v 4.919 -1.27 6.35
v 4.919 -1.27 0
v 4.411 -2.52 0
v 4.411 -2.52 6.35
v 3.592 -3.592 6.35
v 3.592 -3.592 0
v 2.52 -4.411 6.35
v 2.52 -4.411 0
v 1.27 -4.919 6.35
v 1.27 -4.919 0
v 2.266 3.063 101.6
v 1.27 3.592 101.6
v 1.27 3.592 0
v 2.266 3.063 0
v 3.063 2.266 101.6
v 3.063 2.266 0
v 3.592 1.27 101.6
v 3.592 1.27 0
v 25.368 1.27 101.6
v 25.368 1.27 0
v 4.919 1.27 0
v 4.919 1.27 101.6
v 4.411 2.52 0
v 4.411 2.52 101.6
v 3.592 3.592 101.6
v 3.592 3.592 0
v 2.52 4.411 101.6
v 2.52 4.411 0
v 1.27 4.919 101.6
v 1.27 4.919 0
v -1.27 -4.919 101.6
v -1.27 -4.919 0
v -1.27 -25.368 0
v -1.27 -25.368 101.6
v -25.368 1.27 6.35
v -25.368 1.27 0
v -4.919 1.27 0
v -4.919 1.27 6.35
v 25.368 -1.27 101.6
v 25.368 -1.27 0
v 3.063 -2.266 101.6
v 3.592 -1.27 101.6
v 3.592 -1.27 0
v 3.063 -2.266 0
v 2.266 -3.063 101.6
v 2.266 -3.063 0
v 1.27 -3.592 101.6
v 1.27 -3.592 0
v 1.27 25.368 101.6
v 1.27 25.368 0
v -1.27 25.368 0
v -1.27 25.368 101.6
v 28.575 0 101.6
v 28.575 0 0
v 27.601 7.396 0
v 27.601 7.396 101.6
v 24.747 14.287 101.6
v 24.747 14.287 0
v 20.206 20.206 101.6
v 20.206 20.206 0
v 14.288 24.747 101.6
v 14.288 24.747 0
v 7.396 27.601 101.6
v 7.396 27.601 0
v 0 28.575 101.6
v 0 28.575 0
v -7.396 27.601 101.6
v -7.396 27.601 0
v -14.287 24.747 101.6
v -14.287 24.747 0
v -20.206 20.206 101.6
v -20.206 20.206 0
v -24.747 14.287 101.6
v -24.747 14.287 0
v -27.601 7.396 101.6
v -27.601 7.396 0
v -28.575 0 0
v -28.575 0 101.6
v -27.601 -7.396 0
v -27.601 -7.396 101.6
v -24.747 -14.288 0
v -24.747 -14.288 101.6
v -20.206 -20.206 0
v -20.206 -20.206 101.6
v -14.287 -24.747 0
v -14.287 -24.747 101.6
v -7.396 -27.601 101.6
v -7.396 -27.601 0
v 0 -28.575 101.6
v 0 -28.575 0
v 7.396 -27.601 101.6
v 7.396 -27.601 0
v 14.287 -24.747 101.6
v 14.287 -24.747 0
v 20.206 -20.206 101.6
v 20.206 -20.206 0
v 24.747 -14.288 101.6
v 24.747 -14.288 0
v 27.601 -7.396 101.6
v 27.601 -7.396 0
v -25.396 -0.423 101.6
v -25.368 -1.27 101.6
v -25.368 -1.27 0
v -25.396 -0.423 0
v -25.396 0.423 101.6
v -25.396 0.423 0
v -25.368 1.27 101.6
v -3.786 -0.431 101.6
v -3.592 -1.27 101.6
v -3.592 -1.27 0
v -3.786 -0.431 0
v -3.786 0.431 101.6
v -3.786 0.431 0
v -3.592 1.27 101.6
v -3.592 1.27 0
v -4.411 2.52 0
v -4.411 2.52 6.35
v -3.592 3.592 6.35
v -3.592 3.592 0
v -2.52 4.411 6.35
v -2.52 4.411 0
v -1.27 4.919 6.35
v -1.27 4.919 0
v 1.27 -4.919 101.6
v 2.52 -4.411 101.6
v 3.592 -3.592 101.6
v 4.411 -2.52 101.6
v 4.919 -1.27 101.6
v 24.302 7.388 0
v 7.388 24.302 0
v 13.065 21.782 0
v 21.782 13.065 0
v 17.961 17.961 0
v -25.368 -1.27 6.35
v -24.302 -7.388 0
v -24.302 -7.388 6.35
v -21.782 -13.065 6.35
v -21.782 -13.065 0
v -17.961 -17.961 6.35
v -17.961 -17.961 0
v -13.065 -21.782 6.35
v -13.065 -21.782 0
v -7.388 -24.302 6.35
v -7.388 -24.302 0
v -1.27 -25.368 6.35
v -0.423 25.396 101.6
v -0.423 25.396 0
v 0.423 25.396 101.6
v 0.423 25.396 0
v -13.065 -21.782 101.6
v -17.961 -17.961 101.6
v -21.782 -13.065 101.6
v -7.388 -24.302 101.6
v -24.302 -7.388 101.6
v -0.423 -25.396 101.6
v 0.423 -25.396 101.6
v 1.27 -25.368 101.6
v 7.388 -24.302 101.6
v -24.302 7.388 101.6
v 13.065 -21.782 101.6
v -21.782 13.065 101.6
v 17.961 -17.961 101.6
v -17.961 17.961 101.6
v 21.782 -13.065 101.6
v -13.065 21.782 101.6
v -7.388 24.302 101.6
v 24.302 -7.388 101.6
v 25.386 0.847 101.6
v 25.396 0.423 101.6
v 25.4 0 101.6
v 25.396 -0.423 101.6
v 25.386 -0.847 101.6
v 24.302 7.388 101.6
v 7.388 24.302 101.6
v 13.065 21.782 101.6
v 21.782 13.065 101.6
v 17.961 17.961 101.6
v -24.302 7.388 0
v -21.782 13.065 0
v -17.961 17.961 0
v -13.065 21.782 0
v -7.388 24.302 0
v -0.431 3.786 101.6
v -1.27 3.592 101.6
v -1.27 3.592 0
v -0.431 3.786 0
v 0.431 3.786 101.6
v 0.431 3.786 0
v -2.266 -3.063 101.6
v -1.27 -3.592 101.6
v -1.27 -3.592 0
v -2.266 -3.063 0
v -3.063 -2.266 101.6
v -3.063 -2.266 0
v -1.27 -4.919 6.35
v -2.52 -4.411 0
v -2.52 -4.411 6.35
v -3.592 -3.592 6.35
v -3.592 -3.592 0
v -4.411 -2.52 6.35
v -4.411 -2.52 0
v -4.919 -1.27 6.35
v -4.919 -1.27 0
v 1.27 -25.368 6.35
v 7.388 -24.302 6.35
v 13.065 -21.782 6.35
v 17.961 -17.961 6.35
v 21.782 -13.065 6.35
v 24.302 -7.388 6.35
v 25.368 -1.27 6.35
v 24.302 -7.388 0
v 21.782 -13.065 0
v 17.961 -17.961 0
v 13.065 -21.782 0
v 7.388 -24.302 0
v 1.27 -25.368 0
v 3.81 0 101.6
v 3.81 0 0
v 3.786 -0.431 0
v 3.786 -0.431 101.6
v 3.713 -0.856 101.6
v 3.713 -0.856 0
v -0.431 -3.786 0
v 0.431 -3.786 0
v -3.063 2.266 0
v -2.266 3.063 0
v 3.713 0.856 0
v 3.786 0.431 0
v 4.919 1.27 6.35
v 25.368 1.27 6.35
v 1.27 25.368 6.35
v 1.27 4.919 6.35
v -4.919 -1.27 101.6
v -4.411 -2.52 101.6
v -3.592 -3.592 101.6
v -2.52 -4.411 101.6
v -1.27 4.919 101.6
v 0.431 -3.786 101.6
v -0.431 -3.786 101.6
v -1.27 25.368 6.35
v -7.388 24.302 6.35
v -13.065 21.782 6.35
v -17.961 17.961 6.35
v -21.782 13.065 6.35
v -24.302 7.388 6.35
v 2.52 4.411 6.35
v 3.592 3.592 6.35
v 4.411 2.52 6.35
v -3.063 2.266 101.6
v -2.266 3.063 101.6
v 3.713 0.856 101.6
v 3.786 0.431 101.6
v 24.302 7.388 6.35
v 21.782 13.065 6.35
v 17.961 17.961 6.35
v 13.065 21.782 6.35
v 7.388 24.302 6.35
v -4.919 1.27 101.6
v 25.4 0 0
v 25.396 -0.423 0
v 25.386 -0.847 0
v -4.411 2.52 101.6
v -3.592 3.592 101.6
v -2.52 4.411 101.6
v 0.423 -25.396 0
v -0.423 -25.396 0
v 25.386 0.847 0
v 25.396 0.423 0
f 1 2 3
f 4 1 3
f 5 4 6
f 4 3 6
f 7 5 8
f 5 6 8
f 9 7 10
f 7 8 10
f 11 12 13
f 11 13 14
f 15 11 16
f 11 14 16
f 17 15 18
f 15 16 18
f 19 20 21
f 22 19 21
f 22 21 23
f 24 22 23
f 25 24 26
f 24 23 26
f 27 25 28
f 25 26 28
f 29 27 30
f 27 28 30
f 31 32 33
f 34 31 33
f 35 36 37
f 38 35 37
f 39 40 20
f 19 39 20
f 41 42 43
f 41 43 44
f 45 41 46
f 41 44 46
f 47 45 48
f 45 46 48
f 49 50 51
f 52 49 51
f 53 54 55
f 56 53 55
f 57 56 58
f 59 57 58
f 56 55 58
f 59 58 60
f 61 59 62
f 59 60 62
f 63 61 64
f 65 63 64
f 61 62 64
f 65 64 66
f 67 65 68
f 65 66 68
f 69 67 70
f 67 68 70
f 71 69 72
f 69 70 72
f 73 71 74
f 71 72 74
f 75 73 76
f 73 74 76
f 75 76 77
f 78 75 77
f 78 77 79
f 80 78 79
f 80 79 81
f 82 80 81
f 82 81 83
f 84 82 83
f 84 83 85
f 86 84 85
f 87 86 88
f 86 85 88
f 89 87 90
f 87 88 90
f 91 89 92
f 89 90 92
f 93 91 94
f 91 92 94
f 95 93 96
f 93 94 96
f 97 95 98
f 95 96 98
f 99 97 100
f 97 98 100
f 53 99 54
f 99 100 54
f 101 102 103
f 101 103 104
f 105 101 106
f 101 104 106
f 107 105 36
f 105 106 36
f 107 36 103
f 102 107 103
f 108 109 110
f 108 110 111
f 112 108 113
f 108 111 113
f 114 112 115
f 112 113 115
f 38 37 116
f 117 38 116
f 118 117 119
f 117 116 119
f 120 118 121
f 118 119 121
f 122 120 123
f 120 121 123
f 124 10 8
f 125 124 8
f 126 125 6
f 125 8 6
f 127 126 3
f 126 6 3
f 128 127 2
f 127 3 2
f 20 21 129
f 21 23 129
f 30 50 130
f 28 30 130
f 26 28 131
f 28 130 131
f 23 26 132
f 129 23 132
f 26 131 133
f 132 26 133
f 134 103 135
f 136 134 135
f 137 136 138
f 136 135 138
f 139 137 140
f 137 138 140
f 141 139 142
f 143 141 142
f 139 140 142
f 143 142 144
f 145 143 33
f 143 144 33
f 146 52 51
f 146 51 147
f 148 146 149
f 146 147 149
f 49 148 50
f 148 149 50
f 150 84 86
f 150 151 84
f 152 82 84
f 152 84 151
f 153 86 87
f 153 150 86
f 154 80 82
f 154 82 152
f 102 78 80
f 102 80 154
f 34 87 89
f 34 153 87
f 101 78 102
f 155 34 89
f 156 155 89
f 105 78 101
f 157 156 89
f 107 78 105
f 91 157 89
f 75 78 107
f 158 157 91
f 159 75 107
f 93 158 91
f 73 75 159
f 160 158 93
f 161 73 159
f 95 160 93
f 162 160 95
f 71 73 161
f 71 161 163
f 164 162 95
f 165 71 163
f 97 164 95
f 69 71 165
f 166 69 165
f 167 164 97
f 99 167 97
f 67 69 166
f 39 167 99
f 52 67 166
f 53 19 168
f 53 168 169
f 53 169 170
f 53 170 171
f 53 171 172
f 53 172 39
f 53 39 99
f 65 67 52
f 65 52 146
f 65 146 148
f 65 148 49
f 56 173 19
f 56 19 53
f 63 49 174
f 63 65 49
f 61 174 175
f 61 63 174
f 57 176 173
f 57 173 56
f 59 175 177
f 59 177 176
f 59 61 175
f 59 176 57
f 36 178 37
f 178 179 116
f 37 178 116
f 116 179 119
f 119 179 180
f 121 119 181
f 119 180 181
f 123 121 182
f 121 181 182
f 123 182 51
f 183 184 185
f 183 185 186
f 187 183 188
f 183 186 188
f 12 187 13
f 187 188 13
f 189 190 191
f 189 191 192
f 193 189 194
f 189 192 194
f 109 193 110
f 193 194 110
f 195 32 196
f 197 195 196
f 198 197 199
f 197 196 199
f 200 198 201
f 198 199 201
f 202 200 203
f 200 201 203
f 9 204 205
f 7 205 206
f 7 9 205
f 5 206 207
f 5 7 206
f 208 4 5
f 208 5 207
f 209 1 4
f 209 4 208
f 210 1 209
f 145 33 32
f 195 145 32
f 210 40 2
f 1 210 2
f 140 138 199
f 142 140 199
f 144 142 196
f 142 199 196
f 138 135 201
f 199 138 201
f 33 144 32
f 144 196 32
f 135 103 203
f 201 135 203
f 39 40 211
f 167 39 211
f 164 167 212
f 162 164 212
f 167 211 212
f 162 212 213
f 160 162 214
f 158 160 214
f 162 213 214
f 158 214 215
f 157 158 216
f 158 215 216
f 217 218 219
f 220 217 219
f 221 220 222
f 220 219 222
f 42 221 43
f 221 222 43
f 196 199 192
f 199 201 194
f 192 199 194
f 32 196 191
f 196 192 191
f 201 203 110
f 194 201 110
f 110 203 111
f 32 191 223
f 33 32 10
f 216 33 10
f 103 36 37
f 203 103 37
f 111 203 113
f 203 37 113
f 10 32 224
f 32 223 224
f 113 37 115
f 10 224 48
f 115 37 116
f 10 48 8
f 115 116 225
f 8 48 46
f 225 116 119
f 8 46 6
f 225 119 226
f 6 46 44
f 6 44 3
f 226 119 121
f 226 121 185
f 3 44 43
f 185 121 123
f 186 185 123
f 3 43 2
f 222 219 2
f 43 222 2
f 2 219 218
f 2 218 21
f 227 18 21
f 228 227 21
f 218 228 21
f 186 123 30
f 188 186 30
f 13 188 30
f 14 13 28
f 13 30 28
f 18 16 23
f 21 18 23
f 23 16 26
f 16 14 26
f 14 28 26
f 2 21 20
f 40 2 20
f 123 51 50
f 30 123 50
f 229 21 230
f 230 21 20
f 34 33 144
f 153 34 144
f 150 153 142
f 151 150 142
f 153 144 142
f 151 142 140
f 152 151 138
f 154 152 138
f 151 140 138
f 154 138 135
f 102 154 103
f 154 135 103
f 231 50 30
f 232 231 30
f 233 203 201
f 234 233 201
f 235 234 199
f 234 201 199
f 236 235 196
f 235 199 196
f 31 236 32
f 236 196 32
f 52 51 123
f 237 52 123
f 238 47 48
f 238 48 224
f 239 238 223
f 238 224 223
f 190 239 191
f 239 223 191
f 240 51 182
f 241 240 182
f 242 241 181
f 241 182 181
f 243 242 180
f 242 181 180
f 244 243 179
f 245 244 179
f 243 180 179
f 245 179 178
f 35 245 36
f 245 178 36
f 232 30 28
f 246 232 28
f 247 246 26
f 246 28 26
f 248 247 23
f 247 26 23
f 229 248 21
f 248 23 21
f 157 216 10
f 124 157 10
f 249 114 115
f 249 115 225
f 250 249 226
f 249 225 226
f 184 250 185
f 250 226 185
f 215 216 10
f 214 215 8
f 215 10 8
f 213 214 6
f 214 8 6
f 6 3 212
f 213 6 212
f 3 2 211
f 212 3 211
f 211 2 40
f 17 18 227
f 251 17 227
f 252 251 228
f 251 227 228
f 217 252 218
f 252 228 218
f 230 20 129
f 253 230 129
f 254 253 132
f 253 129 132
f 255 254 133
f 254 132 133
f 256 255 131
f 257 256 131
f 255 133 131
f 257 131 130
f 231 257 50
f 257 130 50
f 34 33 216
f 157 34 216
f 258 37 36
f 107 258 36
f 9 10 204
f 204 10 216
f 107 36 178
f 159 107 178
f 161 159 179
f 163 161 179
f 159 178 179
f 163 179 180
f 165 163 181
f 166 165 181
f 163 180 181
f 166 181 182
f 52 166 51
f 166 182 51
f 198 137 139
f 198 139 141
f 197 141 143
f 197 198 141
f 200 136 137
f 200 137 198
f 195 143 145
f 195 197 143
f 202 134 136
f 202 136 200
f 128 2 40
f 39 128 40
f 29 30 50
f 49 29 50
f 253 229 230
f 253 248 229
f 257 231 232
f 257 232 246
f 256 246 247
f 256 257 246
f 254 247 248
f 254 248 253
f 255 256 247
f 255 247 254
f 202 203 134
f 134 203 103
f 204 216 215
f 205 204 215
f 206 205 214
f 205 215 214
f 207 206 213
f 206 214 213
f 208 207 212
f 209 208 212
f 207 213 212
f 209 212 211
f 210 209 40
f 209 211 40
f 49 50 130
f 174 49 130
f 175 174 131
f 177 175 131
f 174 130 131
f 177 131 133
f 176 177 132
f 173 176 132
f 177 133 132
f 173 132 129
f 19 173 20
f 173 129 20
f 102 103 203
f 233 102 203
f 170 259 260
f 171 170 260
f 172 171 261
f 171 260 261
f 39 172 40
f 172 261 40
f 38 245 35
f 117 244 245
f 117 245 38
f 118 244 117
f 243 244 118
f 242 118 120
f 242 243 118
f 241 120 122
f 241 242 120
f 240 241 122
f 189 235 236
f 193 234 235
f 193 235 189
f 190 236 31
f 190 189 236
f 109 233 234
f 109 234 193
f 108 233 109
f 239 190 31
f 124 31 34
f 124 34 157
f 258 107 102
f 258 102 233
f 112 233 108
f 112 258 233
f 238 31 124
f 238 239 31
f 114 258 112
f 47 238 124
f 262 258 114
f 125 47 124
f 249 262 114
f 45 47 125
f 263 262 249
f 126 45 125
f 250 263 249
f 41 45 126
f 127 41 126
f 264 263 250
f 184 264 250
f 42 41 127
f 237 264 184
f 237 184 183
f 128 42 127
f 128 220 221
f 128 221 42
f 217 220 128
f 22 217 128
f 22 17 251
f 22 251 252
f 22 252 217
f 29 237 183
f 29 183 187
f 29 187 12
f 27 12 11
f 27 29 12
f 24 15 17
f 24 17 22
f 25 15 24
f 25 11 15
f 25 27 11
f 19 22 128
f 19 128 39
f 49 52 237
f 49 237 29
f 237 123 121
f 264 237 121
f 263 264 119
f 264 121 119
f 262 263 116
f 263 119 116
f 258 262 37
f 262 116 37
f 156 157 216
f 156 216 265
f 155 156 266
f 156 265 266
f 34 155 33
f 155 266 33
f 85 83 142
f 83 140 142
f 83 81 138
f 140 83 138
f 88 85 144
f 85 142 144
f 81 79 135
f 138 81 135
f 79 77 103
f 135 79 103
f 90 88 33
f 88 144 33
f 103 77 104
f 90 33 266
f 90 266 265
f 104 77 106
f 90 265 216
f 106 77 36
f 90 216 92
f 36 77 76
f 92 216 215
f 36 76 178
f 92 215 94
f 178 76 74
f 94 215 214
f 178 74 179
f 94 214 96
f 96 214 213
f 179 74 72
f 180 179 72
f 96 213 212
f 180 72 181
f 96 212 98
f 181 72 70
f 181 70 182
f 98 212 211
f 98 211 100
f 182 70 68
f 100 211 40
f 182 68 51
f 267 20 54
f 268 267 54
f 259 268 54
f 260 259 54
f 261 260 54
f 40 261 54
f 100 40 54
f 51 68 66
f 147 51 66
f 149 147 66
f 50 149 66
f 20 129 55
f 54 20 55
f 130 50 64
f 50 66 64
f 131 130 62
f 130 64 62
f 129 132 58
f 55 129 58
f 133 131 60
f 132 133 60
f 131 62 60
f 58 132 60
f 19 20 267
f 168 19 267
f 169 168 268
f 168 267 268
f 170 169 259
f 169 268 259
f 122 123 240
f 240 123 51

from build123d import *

# Parameters (mm, degrees)
F0_R     = 28.575
F1_DEPTH = 101.6
F2_DEPTH = 101.6
F3_DEPTH = 6.35


with BuildPart() as f1:
    # F0 (on Top) → F1 (new body)
    with BuildSketch(Plane.XY):
        Circle(F0_R)
        with BuildLine():
            ThreePointArc((25.3682301314, 1.27), (25.3920562907, 0.6351986549), (25.4, 0))
            ThreePointArc((25.4, 0), (25.3920562907, -0.6351986549), (25.3682301314, -1.27))
            ThreePointArc((25.3682301314, -1.27), (17.9605122421, -17.9605122421), (1.27, -25.3682301314))
            ThreePointArc((1.27, -25.3682301314), (0, -25.4), (-1.27, -25.3682301314))
            ThreePointArc((-1.27, -25.3682301314), (-17.9605122421, -17.9605122421), (-25.3682301314, -1.27))
            ThreePointArc((-25.3682301314, -1.27), (-25.4, 0), (-25.3682301314, 1.27))
            ThreePointArc((-25.3682301314, 1.27), (-17.9605122421, 17.9605122421), (-1.27, 25.3682301314))
            ThreePointArc((-1.27, 25.3682301314), (0, 25.4), (1.27, 25.3682301314))
            ThreePointArc((1.27, 25.3682301314), (17.9605122421, 17.9605122421), (25.3682301314, 1.27))
        make_face(mode=Mode.SUBTRACT)
    extrude(amount=F1_DEPTH)


with BuildPart() as f2:
    # F0 (on Top) → F2 (new body)
    with BuildSketch(Plane.XY):
        with BuildLine():
            Line((25.3682301314, -1.27), (25.3682301314, 1.27))
            Line((25.3682301314, 1.27), (4.9186888497, 1.27))
            ThreePointArc((4.9186888497, 1.27), (5.039510857, 0.6401018058), (5.08, 0))
            ThreePointArc((5.08, 0), (5.039510857, -0.6401018058), (4.9186888497, -1.27))
            Line((4.9186888497, -1.27), (25.3682301314, -1.27))
        make_face()
        with BuildLine():
            Line((-1.27, -25.3682301314), (1.27, -25.3682301314))
            Line((1.27, -25.3682301314), (1.27, -4.9186888497))
            ThreePointArc((1.27, -4.9186888497), (0, -5.08), (-1.27, -4.9186888497))
            Line((-1.27, -4.9186888497), (-1.27, -25.3682301314))
        make_face()
        with BuildLine():
            Line((-4.9186888497, 1.27), (-25.3682301314, 1.27))
            Line((-25.3682301314, 1.27), (-25.3682301314, -1.27))
            Line((-25.3682301314, -1.27), (-4.9186888497, -1.27))
            ThreePointArc((-4.9186888497, -1.27), (-5.08, 0), (-4.9186888497, 1.27))
        make_face()
        with BuildLine():
            Line((1.27, 4.9186888497), (1.27, 25.3682301314))
            Line((1.27, 25.3682301314), (-1.27, 25.3682301314))
            Line((-1.27, 25.3682301314), (-1.27, 4.9186888497))
            ThreePointArc((-1.27, 4.9186888497), (0, 5.08), (1.27, 4.9186888497))
        make_face()
        with BuildLine():
            ThreePointArc((1.27, -4.9186888497), (3.5921024484, -3.5921024484), (4.9186888497, -1.27))
            Line((4.9186888497, -1.27), (3.5921024484, -1.27))
            ThreePointArc((3.5921024484, -1.27), (2.6940768363, -2.6940768363), (1.27, -3.5921024484))
            Line((1.27, -3.5921024484), (1.27, -4.9186888497))
        make_face()
        with BuildLine():
            ThreePointArc((5.08, 0), (5.039510857, 0.6401018058), (4.9186888497, 1.27))
            Line((4.9186888497, 1.27), (3.5921024484, 1.27))
            ThreePointArc((3.5921024484, 1.27), (3.7551305123, 0.6442785389), (3.81, 0))
            ThreePointArc((3.81, 0), (3.7551305123, -0.6442785389), (3.5921024484, -1.27))
            Line((3.5921024484, -1.27), (4.9186888497, -1.27))
            ThreePointArc((4.9186888497, -1.27), (5.039510857, -0.6401018058), (5.08, 0))
        make_face()
        with BuildLine():
            Line((3.5921024484, 1.27), (4.9186888497, 1.27))
            ThreePointArc((4.9186888497, 1.27), (3.5921024484, 3.5921024484), (1.27, 4.9186888497))
            Line((1.27, 4.9186888497), (1.27, 3.5921024484))
            ThreePointArc((1.27, 3.5921024484), (2.6940768363, 2.6940768363), (3.5921024484, 1.27))
        make_face()
        with BuildLine():
            Line((1.27, 3.5921024484), (1.27, 4.9186888497))
            ThreePointArc((1.27, 4.9186888497), (0, 5.08), (-1.27, 4.9186888497))
            Line((-1.27, 4.9186888497), (-1.27, 3.5921024484))
            ThreePointArc((-1.27, 3.5921024484), (0, 3.81), (1.27, 3.5921024484))
        make_face()
        with BuildLine():
            Line((-1.27, 3.5921024484), (-1.27, 4.9186888497))
            ThreePointArc((-1.27, 4.9186888497), (-3.5921024484, 3.5921024484), (-4.9186888497, 1.27))
            Line((-4.9186888497, 1.27), (-3.5921024484, 1.27))
            ThreePointArc((-3.5921024484, 1.27), (-2.6940768363, 2.6940768363), (-1.27, 3.5921024484))
        make_face()
        with BuildLine():
            Line((-3.5921024484, 1.27), (-4.9186888497, 1.27))
            ThreePointArc((-4.9186888497, 1.27), (-5.08, 0), (-4.9186888497, -1.27))
            Line((-4.9186888497, -1.27), (-3.5921024484, -1.27))
            ThreePointArc((-3.5921024484, -1.27), (-3.81, 0), (-3.5921024484, 1.27))
        make_face()
        with BuildLine():
            ThreePointArc((-4.9186888497, -1.27), (-3.5921024484, -3.5921024484), (-1.27, -4.9186888497))
            Line((-1.27, -4.9186888497), (-1.27, -3.5921024484))
            ThreePointArc((-1.27, -3.5921024484), (-2.6940768363, -2.6940768363), (-3.5921024484, -1.27))
            Line((-3.5921024484, -1.27), (-4.9186888497, -1.27))
        make_face()
        with BuildLine():
            ThreePointArc((-1.27, -4.9186888497), (0, -5.08), (1.27, -4.9186888497))
            Line((1.27, -4.9186888497), (1.27, -3.5921024484))
            ThreePointArc((1.27, -3.5921024484), (0, -3.81), (-1.27, -3.5921024484))
            Line((-1.27, -3.5921024484), (-1.27, -4.9186888497))
        make_face()
    extrude(amount=F2_DEPTH)


with BuildPart() as f3:
    # F0 (on Top) → F3 (new body)
    with BuildSketch(Plane.XY):
        with BuildLine():
            Line((4.9186888497, 1.27), (25.3682301314, 1.27))
            ThreePointArc((25.3682301314, 1.27), (17.9605122421, 17.9605122421), (1.27, 25.3682301314))
            Line((1.27, 25.3682301314), (1.27, 4.9186888497))
            ThreePointArc((1.27, 4.9186888497), (3.5921024484, 3.5921024484), (4.9186888497, 1.27))
        make_face()
    extrude(amount=F3_DEPTH)


with BuildPart() as f3b:
    # F0 (on Top) → F3, piece 2 (new body)
    with BuildSketch(Plane.XY):
        with BuildLine():
            Line((-1.27, 4.9186888497), (-1.27, 25.3682301314))
            ThreePointArc((-1.27, 25.3682301314), (-17.9605122421, 17.9605122421), (-25.3682301314, 1.27))
            Line((-25.3682301314, 1.27), (-4.9186888497, 1.27))
            ThreePointArc((-4.9186888497, 1.27), (-3.5921024484, 3.5921024484), (-1.27, 4.9186888497))
        make_face()
    extrude(amount=F3_DEPTH)


with BuildPart() as f3c:
    # F0 (on Top) → F3, piece 3 (new body)
    with BuildSketch(Plane.XY):
        with BuildLine():
            ThreePointArc((-25.3682301314, -1.27), (-17.9605122421, -17.9605122421), (-1.27, -25.3682301314))
            Line((-1.27, -25.3682301314), (-1.27, -4.9186888497))
            ThreePointArc((-1.27, -4.9186888497), (-3.5921024484, -3.5921024484), (-4.9186888497, -1.27))
            Line((-4.9186888497, -1.27), (-25.3682301314, -1.27))
        make_face()
    extrude(amount=F3_DEPTH)


with BuildPart() as f3d:
    # F0 (on Top) → F3, piece 4 (new body)
    with BuildSketch(Plane.XY):
        with BuildLine():
            ThreePointArc((1.27, -25.3682301314), (17.9605122421, -17.9605122421), (25.3682301314, -1.27))
            Line((25.3682301314, -1.27), (4.9186888497, -1.27))
            ThreePointArc((4.9186888497, -1.27), (3.5921024484, -3.5921024484), (1.27, -4.9186888497))
            Line((1.27, -4.9186888497), (1.27, -25.3682301314))
        make_face()
    extrude(amount=F3_DEPTH)


solid = Compound([f1.part, f2.part, f3.part, f3b.part, f3c.part, f3d.part])
